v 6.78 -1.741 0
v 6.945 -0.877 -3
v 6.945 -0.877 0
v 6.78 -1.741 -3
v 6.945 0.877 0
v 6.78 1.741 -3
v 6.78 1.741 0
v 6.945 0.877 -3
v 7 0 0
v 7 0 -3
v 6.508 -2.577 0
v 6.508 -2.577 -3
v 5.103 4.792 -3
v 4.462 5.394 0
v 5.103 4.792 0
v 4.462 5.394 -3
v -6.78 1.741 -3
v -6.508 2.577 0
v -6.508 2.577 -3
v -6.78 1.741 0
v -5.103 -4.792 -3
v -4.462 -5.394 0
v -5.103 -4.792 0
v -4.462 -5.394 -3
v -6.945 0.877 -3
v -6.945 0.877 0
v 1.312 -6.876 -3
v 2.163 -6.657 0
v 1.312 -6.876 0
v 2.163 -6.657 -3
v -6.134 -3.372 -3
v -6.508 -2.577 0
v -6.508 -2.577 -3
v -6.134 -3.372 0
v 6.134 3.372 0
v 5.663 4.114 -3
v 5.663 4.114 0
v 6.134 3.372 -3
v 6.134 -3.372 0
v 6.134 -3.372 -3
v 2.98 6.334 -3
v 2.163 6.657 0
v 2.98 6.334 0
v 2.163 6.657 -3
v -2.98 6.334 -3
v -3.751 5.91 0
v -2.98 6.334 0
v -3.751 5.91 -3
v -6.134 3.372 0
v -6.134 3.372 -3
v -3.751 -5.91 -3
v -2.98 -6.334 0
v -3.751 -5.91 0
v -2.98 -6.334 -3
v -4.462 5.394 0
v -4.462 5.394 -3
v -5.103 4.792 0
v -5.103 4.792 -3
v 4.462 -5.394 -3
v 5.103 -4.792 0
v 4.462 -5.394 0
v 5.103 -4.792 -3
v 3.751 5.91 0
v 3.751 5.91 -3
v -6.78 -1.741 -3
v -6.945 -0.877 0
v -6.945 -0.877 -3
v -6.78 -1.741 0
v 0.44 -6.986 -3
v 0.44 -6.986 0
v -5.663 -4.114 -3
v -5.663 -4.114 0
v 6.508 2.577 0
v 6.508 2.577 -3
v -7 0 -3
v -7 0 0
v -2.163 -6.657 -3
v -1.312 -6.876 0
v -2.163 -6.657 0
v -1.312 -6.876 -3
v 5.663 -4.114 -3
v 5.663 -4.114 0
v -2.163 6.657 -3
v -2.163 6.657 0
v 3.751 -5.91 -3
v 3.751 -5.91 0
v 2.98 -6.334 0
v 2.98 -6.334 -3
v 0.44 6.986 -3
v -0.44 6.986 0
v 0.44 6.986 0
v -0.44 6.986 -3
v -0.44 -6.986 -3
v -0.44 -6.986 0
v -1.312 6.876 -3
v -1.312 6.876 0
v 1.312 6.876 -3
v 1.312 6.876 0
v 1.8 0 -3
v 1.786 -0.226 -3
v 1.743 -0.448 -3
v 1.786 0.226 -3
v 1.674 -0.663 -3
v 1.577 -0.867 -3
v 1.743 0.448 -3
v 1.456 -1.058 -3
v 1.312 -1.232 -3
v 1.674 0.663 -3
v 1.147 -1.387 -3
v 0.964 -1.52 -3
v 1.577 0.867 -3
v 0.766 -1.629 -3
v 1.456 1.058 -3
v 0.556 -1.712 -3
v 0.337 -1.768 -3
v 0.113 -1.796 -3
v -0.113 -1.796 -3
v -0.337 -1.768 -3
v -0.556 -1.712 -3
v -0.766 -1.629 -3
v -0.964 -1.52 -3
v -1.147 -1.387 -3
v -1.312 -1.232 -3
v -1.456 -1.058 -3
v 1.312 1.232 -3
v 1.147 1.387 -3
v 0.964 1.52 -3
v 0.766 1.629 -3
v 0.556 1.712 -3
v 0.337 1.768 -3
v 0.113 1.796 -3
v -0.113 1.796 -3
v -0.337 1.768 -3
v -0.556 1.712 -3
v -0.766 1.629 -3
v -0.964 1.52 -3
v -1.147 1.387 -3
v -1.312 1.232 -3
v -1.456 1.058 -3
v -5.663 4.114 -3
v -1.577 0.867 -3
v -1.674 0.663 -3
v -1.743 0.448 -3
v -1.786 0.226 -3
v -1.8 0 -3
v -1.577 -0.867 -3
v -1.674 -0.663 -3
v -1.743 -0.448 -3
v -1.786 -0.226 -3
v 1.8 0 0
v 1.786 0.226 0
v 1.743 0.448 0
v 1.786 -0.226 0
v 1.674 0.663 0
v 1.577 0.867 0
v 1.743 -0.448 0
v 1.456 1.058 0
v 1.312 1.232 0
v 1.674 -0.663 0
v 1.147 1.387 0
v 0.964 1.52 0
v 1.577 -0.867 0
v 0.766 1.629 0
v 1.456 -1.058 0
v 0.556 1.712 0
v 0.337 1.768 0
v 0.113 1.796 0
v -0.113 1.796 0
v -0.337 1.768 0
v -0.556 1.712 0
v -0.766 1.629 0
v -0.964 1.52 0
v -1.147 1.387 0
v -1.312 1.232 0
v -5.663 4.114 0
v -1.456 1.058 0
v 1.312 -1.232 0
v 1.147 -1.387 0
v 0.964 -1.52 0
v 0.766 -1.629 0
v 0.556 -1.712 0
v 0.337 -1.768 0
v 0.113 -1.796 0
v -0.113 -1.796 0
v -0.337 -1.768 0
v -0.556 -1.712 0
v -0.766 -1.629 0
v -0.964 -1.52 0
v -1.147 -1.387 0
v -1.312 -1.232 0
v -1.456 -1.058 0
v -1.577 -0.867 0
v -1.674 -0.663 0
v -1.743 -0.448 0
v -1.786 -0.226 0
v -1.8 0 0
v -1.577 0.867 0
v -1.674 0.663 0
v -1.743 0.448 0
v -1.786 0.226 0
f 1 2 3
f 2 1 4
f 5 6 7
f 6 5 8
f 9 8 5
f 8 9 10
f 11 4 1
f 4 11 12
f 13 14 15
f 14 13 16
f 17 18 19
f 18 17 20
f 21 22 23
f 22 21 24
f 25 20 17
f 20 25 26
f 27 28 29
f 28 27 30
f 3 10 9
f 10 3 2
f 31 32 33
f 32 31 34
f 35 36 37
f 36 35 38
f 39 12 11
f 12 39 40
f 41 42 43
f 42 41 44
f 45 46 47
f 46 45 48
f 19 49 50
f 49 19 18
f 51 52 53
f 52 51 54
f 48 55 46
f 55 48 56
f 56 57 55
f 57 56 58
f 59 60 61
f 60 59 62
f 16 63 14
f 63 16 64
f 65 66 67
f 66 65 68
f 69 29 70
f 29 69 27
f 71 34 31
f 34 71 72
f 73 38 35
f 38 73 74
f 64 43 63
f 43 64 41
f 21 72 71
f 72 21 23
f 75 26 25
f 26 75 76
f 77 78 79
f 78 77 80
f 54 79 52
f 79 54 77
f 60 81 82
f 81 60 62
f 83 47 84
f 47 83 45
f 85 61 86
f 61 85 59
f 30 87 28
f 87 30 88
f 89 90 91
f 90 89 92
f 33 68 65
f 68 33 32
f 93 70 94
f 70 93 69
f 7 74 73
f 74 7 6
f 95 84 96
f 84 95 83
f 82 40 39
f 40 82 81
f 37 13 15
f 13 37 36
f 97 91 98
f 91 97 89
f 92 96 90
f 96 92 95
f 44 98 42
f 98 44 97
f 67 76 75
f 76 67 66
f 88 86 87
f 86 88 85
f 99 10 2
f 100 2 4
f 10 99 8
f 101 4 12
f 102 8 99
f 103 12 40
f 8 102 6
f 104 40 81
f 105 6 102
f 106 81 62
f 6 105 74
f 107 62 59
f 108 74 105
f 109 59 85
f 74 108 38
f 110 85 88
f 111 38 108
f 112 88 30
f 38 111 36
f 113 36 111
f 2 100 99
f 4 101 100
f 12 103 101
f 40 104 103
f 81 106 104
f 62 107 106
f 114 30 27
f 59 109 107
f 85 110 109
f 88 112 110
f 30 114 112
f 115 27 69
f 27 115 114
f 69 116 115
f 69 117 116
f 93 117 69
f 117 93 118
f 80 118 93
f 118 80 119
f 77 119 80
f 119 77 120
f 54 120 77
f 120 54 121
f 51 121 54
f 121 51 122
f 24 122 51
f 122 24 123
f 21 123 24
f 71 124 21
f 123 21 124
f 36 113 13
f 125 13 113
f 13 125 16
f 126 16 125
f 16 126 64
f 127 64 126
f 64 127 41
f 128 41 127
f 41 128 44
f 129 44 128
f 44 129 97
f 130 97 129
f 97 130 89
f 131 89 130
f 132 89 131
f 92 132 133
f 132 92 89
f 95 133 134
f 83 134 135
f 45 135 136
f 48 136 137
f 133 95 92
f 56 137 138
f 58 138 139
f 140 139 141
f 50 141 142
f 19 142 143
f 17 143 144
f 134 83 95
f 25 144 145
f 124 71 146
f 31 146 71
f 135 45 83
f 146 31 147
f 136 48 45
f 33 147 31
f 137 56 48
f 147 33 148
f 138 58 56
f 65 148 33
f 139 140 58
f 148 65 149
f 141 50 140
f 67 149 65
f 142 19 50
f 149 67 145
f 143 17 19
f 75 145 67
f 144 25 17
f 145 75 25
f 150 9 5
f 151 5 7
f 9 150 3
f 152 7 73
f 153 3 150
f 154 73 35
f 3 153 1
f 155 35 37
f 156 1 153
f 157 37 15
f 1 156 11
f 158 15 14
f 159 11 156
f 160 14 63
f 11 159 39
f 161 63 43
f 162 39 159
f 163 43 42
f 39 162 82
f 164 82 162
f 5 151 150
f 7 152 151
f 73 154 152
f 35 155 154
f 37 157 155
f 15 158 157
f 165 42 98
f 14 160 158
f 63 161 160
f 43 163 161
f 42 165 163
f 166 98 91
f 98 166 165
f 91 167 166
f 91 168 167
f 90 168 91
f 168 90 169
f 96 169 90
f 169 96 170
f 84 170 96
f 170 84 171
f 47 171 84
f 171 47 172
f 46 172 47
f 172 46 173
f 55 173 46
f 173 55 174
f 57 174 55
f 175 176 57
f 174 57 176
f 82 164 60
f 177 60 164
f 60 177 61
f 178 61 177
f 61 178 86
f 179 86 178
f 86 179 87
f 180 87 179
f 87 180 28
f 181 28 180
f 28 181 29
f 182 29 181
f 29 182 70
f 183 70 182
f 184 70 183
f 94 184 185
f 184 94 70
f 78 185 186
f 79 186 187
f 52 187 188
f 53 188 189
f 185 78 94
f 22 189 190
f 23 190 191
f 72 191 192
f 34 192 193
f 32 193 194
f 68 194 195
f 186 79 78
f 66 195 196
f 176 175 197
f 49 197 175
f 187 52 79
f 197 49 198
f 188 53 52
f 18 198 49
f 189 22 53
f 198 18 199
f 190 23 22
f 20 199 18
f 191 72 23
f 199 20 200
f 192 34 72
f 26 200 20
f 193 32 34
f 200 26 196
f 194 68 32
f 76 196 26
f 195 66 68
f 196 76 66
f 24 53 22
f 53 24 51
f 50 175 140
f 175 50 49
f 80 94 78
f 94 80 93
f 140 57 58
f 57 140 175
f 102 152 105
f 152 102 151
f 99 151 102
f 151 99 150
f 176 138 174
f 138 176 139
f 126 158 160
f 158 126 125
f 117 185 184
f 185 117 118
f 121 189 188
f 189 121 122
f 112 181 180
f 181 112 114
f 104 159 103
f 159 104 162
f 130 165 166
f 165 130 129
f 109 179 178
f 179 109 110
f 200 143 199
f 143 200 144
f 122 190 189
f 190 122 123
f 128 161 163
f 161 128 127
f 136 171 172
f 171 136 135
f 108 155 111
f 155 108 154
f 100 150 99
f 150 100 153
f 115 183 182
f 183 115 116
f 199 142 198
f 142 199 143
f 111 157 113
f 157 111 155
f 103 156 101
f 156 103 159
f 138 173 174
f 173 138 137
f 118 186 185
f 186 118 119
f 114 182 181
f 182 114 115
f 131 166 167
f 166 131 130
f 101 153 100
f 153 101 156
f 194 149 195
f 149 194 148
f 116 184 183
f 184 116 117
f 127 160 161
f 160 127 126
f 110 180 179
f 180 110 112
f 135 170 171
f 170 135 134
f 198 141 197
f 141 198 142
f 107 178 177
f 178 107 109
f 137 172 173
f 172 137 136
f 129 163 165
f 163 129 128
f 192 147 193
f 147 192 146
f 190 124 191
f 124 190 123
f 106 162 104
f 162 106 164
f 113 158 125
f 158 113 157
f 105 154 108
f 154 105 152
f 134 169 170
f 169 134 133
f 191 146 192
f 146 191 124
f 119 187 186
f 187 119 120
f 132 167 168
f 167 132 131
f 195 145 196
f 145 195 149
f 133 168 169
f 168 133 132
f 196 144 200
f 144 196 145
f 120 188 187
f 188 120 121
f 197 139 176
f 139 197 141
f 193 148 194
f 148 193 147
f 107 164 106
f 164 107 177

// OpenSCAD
$fn = 50;


difference() {
	union() {
		translate(v = [0, 0, -3.0000000000]) {
			cylinder(h = 3, r = 7.0000000000);
		}
		cylinder(h = 0, r = 13.0000000000);
	}
	union() {
		#translate(v = [0, 0, -3]) {
			cylinder(h = 3, r = 1.8000000000);
		}
	}
}
